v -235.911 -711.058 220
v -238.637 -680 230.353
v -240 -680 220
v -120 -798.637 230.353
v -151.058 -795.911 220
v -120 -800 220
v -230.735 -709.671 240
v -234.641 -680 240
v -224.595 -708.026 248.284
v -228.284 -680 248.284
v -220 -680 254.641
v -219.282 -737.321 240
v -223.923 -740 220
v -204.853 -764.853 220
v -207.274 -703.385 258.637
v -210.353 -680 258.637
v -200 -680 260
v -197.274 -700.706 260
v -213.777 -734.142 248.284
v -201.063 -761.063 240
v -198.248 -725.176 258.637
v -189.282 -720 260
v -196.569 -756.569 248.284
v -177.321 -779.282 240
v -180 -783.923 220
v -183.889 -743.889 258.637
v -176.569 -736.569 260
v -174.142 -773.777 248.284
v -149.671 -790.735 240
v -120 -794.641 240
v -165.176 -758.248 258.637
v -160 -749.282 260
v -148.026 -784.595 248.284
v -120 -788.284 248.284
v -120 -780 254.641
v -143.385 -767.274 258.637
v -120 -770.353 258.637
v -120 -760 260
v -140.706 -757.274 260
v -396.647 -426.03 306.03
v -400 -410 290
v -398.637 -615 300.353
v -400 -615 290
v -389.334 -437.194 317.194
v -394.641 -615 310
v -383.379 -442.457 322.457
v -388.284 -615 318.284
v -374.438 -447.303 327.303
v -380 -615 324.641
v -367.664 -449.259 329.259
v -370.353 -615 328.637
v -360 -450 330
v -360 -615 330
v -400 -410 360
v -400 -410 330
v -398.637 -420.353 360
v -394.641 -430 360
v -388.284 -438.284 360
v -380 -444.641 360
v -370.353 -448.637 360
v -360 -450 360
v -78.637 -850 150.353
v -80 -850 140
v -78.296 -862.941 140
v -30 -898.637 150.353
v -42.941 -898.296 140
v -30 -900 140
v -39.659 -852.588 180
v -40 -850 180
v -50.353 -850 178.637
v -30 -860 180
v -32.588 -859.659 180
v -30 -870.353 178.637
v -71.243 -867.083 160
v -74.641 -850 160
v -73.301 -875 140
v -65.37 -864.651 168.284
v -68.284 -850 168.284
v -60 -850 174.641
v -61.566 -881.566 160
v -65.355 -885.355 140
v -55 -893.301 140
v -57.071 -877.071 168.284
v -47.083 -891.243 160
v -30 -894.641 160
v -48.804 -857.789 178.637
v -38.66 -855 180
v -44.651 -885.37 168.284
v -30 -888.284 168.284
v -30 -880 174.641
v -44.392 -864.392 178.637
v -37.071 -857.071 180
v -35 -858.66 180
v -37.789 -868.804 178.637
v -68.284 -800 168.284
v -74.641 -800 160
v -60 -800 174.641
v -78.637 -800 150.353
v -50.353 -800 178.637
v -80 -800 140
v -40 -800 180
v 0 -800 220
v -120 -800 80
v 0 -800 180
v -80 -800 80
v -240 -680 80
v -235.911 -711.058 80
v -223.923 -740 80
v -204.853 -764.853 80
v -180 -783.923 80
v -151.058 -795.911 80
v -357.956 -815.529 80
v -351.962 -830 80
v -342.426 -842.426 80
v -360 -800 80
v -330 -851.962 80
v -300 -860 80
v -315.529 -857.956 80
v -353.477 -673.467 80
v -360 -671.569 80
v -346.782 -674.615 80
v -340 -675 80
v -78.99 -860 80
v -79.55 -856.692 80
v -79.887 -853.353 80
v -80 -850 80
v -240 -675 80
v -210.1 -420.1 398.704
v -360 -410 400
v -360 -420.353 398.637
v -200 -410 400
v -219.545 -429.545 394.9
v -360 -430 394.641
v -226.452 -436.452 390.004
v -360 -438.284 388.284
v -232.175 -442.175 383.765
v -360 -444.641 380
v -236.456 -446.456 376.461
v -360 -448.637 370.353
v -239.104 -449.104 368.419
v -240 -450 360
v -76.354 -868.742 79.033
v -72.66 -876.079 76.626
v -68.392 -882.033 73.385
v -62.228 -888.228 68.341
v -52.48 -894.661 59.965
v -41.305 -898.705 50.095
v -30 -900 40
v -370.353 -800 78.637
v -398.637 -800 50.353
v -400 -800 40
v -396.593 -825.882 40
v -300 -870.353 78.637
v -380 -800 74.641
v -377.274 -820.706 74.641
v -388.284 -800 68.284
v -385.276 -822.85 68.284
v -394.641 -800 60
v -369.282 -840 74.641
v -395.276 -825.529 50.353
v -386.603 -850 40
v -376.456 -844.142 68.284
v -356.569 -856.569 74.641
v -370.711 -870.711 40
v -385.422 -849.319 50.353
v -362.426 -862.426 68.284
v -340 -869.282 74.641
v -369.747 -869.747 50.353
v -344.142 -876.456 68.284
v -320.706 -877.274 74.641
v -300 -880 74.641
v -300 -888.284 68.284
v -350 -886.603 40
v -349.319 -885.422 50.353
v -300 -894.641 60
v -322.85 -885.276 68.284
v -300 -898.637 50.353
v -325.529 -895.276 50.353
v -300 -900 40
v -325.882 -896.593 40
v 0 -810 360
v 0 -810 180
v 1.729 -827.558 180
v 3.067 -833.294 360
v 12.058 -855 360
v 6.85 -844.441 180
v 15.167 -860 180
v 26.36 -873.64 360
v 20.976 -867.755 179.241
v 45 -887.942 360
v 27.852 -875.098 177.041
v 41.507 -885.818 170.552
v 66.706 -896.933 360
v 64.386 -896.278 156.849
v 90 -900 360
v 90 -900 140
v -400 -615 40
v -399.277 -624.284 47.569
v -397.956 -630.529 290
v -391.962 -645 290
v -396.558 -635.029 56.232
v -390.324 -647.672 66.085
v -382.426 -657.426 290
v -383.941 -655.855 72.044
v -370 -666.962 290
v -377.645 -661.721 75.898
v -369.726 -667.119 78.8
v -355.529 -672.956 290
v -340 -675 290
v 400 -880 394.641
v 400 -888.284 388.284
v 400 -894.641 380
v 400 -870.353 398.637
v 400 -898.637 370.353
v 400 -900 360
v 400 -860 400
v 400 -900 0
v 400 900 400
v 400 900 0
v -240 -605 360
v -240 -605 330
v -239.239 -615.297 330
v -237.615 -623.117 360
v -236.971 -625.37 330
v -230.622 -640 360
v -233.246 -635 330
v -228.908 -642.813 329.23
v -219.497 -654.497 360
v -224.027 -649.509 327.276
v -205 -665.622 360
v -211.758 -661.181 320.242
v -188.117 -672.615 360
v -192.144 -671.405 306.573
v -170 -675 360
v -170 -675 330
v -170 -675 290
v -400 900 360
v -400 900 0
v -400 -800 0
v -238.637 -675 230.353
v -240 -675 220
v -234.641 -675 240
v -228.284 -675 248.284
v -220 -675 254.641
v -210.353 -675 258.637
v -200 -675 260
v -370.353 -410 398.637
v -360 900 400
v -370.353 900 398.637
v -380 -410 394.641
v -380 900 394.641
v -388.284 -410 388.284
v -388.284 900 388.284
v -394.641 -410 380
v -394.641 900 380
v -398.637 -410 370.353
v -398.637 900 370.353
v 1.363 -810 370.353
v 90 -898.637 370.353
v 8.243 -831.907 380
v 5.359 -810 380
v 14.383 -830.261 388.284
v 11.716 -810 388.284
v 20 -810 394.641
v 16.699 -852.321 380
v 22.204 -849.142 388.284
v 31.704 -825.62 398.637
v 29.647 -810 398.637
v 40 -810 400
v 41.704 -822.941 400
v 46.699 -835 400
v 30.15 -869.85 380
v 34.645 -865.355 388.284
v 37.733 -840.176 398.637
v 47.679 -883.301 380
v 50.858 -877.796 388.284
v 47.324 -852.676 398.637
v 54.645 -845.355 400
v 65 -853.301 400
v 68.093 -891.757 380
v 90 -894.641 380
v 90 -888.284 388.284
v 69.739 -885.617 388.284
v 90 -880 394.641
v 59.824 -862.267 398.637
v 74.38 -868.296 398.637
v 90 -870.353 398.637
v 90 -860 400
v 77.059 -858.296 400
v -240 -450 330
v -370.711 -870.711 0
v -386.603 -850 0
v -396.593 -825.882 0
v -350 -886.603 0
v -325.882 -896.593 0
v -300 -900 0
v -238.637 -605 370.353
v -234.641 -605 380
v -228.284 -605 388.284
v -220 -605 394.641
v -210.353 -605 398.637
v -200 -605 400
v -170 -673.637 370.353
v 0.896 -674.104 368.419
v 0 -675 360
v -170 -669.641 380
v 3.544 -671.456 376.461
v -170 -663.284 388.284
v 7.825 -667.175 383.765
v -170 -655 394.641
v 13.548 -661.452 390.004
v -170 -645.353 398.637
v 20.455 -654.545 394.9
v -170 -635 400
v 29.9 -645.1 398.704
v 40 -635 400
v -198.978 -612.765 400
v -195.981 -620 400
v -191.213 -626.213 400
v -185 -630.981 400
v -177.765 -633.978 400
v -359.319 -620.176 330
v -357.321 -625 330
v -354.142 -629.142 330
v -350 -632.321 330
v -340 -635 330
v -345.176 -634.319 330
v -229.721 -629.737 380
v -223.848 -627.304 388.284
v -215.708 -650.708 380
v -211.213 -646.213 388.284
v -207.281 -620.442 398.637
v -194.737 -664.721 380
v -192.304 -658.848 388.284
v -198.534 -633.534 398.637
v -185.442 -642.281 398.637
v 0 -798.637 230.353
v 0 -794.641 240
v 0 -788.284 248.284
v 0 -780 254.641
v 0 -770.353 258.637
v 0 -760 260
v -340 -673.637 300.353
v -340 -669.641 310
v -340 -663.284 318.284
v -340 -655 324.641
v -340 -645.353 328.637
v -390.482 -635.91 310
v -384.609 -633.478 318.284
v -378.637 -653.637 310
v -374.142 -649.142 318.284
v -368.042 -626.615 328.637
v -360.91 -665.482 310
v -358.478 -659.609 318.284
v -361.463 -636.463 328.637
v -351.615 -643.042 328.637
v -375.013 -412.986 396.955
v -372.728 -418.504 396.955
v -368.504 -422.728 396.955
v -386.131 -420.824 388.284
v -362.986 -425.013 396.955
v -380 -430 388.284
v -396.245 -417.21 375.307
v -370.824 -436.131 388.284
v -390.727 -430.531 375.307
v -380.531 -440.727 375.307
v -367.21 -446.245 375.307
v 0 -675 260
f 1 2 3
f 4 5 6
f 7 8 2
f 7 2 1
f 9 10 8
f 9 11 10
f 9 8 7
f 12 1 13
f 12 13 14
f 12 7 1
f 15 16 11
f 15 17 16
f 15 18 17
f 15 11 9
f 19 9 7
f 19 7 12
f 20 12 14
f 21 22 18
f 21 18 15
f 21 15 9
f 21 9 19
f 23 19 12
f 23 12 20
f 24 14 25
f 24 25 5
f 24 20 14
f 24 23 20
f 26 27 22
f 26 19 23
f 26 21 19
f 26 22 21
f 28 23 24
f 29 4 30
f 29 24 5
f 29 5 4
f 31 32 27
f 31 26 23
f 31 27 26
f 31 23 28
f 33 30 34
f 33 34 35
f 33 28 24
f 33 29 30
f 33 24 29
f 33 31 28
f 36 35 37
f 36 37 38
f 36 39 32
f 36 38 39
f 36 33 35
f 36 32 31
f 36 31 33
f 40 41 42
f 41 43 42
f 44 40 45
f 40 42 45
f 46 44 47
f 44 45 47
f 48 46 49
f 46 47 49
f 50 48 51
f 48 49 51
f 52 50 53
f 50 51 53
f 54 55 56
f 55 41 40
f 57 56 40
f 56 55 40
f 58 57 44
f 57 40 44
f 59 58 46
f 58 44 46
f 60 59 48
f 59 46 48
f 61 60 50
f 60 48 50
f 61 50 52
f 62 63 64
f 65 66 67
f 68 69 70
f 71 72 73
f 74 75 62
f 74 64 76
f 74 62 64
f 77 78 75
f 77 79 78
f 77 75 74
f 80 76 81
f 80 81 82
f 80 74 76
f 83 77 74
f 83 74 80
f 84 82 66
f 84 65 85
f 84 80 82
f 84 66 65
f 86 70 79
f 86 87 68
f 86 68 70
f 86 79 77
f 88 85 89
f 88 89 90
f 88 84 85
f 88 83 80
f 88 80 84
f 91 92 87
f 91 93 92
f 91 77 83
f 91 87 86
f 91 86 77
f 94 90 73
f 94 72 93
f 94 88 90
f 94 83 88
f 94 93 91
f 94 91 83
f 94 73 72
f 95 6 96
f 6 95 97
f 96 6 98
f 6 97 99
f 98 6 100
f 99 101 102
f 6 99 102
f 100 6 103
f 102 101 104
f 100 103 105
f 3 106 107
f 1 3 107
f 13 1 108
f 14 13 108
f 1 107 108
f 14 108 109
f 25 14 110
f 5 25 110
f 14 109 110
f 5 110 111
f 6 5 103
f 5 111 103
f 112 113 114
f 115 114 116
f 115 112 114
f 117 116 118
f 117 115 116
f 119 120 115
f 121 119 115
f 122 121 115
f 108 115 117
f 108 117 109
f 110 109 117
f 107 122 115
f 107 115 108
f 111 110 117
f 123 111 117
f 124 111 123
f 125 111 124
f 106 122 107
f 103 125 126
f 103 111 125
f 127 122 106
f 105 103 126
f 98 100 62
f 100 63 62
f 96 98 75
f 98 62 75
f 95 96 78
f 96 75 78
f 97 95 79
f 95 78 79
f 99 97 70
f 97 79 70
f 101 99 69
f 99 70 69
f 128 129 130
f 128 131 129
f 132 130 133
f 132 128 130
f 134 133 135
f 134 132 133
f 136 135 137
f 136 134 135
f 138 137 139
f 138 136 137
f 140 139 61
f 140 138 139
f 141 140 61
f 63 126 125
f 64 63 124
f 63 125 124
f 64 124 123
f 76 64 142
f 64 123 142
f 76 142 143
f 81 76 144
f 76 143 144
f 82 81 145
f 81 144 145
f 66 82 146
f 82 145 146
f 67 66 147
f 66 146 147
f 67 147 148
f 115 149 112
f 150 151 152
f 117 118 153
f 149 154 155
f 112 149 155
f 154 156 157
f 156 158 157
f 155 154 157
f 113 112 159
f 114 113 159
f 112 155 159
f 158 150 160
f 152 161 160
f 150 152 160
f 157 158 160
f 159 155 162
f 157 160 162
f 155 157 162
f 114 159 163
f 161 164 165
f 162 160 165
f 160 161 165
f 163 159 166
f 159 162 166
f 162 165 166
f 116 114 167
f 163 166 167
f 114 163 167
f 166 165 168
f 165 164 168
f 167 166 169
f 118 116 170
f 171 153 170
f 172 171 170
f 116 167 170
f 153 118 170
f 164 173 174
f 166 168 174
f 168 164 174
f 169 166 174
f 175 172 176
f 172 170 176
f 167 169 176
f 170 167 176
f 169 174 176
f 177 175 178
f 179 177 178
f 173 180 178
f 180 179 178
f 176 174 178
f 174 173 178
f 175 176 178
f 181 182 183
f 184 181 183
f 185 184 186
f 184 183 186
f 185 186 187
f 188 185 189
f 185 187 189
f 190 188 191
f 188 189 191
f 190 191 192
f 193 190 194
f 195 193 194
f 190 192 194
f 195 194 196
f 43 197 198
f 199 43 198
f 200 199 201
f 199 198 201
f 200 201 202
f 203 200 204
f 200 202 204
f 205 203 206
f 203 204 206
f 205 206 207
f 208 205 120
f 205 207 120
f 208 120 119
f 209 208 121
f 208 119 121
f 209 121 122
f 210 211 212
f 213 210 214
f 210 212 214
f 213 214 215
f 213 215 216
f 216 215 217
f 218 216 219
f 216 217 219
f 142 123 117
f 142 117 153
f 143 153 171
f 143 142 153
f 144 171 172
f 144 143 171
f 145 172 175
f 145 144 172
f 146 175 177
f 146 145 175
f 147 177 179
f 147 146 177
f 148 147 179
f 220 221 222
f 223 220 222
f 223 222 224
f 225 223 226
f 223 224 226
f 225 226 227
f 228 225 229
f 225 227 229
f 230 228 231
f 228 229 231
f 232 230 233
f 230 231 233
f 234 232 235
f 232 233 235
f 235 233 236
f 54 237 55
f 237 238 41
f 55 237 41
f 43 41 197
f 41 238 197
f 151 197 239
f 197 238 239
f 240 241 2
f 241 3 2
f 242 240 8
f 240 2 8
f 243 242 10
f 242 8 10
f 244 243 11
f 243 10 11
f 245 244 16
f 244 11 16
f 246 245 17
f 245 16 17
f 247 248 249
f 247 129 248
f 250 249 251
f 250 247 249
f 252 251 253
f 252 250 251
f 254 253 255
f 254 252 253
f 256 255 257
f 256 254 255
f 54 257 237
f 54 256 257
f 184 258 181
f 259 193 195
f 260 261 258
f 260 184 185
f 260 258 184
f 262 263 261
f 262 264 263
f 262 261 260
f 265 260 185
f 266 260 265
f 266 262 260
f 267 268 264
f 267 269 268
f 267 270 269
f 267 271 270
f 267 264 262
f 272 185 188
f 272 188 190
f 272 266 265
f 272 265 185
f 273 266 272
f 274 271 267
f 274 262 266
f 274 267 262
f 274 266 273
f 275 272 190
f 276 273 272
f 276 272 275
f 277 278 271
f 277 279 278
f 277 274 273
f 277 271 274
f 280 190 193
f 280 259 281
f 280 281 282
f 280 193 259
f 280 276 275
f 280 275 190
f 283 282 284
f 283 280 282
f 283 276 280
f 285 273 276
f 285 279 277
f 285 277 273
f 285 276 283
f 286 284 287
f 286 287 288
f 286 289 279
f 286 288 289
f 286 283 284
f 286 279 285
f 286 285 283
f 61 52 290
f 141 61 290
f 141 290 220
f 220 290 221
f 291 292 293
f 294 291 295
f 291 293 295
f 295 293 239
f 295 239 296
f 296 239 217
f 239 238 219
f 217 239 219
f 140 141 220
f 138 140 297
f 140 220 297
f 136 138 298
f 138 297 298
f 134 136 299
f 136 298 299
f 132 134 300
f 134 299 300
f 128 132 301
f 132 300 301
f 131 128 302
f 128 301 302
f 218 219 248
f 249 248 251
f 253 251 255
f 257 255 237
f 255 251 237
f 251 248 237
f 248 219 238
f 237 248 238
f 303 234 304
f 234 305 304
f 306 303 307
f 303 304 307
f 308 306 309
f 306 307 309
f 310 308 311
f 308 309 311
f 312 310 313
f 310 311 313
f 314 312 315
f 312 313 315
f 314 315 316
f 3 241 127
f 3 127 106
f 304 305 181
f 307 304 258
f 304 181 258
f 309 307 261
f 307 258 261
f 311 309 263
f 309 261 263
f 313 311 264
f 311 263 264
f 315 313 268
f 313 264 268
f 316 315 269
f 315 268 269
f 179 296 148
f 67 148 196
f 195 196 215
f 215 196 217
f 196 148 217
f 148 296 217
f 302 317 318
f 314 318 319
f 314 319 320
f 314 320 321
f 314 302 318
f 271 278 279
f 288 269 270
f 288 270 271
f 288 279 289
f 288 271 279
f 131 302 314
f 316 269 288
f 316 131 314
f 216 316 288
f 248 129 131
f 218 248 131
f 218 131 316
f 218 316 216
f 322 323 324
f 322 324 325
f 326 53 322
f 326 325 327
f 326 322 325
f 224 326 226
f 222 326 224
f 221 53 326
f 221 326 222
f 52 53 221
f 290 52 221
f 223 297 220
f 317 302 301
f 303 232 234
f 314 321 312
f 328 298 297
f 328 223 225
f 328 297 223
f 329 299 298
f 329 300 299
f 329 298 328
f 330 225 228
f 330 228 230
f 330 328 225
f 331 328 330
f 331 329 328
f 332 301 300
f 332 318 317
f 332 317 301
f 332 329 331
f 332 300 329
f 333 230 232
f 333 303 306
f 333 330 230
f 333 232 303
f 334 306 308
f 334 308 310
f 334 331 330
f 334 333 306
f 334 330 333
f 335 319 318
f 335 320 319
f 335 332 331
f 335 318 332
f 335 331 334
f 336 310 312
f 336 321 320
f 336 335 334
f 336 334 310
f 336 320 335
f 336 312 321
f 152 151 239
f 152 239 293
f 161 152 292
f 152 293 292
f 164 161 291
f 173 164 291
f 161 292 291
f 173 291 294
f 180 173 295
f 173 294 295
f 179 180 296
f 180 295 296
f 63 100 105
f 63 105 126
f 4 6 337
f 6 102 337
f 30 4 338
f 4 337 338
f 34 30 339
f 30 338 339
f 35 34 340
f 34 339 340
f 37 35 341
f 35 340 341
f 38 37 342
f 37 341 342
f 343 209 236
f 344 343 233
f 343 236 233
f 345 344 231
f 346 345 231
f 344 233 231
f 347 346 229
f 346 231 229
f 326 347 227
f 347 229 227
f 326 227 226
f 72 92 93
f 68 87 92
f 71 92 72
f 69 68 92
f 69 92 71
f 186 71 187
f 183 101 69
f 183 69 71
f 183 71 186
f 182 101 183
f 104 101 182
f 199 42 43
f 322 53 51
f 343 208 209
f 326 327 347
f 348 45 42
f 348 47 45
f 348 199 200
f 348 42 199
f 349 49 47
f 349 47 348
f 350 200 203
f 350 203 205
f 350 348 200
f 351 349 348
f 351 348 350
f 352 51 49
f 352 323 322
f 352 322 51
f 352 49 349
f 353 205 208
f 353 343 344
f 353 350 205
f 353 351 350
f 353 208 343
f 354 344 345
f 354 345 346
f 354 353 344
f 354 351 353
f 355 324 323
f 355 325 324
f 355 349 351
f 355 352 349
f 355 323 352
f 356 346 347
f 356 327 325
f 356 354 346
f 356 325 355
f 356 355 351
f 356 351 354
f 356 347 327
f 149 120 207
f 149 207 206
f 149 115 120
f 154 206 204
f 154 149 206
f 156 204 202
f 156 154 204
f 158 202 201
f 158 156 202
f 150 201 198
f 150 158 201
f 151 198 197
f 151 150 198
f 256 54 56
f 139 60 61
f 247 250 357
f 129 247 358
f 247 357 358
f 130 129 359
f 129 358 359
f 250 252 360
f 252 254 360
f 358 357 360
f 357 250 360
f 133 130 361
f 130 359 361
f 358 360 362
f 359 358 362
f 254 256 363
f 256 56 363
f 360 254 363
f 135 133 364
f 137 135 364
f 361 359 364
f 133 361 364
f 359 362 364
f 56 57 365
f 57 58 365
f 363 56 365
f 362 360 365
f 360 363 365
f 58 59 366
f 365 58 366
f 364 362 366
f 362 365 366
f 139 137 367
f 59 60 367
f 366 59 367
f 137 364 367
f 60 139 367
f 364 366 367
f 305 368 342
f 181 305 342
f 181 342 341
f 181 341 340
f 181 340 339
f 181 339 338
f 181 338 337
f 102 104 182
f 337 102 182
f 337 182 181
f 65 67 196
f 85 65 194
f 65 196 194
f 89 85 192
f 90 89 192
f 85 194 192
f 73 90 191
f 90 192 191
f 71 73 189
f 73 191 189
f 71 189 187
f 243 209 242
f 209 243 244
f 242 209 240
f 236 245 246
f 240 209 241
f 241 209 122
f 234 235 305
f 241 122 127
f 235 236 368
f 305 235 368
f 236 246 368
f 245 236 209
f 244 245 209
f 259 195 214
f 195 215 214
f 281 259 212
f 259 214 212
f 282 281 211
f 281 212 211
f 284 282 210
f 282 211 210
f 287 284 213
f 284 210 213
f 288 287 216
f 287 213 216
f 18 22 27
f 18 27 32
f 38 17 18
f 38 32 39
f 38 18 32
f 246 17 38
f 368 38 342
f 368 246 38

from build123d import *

# Parameters (mm, degrees)
F1_DEPTH = 80
F2_W     = 80
F2_H     = 225
F3_DEPTH = 320
F4_DEPTH = 250
F2_H_2   = 125
F5_DEPTH = 180
F6_DEPTH = 100
F7_R     = 40


with BuildPart() as f1:
    # F0 (on Top) → F1 (new body)
    with BuildSketch(Plane.XY):
        with BuildLine():
            ThreePointArc((-400, -800), (-370.7106781187, -870.7106781187), (-300, -900))
            Line((-300, -900), (400, -900))
            Line((400, -900), (400, 900))
            Line((400, 900), (-400, 900))
            Line((-400, 900), (-400, -800))
        make_face()
    extrude(amount=F1_DEPTH)

    # F2 (on face) → F3 (join)
    with BuildSketch(Plane.XY.offset(80)):
        with BuildLine():
            Line((400, -900), (400, 900))
            Line((400, 900), (-400, 900))
            Line((-400, 900), (-400, 0))
            Line((-400, 0), (0, 0))
            Line((0, 0), (0, -450))
            Line((0, -450), (0, -675))
            Line((0, -675), (0, -800))
            Line((0, -800), (0, -810))
            ThreePointArc((0, -810), (26.3603896932, -873.6396103068), (90, -900))
            Line((90, -900), (122.6464435458, -900))
            Line((122.6464435458, -900), (400, -900))
        make_face()
        with BuildLine():
            Line((0, 0), (-400, 0))
            Line((-400, 0), (-400, -410))
            ThreePointArc((-400, -410), (-388.2842712475, -438.2842712475), (-360, -450))
            Line((-360, -450), (-240, -450))
            Line((-240, -450), (-80, -450))
            Line((-80, -450), (0, -450))
            Line((0, -450), (0, 0))
        make_face()
        with Locations((-40, -562.5)):
            Rectangle(F2_W, F2_H)
        with BuildLine():
            Line((-80, -450), (-240, -450))
            Line((-240, -450), (-240, -605))
            ThreePointArc((-240, -605), (-219.4974746831, -654.4974746831), (-170, -675))
            Line((-170, -675), (-80, -675))
            Line((-80, -675), (-80, -450))
        make_face()
    extrude(amount=F3_DEPTH)

    # F2 (on face) → F4 (join)
    with BuildSketch(Plane.XY.offset(80)):
        with BuildLine():
            ThreePointArc((-360, -450), (-388.2842712475, -438.2842712475), (-400, -410))
            Line((-400, -410), (-400, -450))
            Line((-400, -450), (-400, -615))
            ThreePointArc((-400, -615), (-382.4264068712, -657.4264068712), (-340, -675))
            Line((-340, -675), (-240, -675))
            Line((-240, -675), (-240, -605))
            Line((-240, -605), (-240, -450))
            Line((-240, -450), (-360, -450))
        make_face()
        with BuildLine():
            ThreePointArc((-170, -675), (-219.4974746831, -654.4974746831), (-240, -605))
            Line((-240, -605), (-240, -675))
            Line((-240, -675), (-170, -675))
        make_face()
    extrude(amount=F4_DEPTH)

    # F2 (on face) → F5 (join)
    with BuildSketch(Plane.XY.offset(80)):
        with BuildLine():
            Line((-80, -800), (-80, -675))
            Line((-80, -675), (-170, -675))
            Line((-170, -675), (-240, -675))
            Line((-240, -675), (-240, -680))
            ThreePointArc((-240, -680), (-204.8528137424, -764.8528137424), (-120, -800))
            Line((-120, -800), (-80, -800))
        make_face()
        with Locations((-40, -562.5)):
            Rectangle(F2_W, F2_H)
        with Locations((-40, -737.5)):
            Rectangle(F2_W, F2_H_2)
        with BuildLine():
            ThreePointArc((-170, -675), (-219.4974746831, -654.4974746831), (-240, -605))
            Line((-240, -605), (-240, -675))
            Line((-240, -675), (-170, -675))
        make_face()
    extrude(amount=F5_DEPTH)

    # F2 (on face) → F6 (join)
    with BuildSketch(Plane.XY.offset(80)):
        with Locations((-40, -562.5)):
            Rectangle(F2_W, F2_H)
        with Locations((-40, -737.5)):
            Rectangle(F2_W, F2_H_2)
        with BuildLine():
            Line((-30, -900), (0, -900))
            Line((0, -900), (0, -810))
            Line((0, -810), (0, -800))
            Line((0, -800), (-80, -800))
            Line((-80, -800), (-80, -850))
            ThreePointArc((-80, -850), (-65.3553390593, -885.3553390593), (-30, -900))
        make_face()
        with BuildLine():
            Line((0, -900), (90, -900))
            ThreePointArc((90, -900), (26.3603896932, -873.6396103068), (0, -810))
            Line((0, -810), (0, -900))
        make_face()
    extrude(amount=F6_DEPTH)

    # F7
    f7_edges = [f1.edges().sort_by_distance(p)[0] for p in [
        (-219.497475, -654.497475, 400),
        (26.36039, -873.63961, 400),
        (-300, -450, 400),
        (-382.426407, -657.426407, 330),
        (-204.852814, -764.852814, 260),
        (-65.355339, -885.355339, 180),
        (-370.710678, -870.710678, 80),
    ]]
    fillet(f7_edges, radius=F7_R)


solid = f1.part
